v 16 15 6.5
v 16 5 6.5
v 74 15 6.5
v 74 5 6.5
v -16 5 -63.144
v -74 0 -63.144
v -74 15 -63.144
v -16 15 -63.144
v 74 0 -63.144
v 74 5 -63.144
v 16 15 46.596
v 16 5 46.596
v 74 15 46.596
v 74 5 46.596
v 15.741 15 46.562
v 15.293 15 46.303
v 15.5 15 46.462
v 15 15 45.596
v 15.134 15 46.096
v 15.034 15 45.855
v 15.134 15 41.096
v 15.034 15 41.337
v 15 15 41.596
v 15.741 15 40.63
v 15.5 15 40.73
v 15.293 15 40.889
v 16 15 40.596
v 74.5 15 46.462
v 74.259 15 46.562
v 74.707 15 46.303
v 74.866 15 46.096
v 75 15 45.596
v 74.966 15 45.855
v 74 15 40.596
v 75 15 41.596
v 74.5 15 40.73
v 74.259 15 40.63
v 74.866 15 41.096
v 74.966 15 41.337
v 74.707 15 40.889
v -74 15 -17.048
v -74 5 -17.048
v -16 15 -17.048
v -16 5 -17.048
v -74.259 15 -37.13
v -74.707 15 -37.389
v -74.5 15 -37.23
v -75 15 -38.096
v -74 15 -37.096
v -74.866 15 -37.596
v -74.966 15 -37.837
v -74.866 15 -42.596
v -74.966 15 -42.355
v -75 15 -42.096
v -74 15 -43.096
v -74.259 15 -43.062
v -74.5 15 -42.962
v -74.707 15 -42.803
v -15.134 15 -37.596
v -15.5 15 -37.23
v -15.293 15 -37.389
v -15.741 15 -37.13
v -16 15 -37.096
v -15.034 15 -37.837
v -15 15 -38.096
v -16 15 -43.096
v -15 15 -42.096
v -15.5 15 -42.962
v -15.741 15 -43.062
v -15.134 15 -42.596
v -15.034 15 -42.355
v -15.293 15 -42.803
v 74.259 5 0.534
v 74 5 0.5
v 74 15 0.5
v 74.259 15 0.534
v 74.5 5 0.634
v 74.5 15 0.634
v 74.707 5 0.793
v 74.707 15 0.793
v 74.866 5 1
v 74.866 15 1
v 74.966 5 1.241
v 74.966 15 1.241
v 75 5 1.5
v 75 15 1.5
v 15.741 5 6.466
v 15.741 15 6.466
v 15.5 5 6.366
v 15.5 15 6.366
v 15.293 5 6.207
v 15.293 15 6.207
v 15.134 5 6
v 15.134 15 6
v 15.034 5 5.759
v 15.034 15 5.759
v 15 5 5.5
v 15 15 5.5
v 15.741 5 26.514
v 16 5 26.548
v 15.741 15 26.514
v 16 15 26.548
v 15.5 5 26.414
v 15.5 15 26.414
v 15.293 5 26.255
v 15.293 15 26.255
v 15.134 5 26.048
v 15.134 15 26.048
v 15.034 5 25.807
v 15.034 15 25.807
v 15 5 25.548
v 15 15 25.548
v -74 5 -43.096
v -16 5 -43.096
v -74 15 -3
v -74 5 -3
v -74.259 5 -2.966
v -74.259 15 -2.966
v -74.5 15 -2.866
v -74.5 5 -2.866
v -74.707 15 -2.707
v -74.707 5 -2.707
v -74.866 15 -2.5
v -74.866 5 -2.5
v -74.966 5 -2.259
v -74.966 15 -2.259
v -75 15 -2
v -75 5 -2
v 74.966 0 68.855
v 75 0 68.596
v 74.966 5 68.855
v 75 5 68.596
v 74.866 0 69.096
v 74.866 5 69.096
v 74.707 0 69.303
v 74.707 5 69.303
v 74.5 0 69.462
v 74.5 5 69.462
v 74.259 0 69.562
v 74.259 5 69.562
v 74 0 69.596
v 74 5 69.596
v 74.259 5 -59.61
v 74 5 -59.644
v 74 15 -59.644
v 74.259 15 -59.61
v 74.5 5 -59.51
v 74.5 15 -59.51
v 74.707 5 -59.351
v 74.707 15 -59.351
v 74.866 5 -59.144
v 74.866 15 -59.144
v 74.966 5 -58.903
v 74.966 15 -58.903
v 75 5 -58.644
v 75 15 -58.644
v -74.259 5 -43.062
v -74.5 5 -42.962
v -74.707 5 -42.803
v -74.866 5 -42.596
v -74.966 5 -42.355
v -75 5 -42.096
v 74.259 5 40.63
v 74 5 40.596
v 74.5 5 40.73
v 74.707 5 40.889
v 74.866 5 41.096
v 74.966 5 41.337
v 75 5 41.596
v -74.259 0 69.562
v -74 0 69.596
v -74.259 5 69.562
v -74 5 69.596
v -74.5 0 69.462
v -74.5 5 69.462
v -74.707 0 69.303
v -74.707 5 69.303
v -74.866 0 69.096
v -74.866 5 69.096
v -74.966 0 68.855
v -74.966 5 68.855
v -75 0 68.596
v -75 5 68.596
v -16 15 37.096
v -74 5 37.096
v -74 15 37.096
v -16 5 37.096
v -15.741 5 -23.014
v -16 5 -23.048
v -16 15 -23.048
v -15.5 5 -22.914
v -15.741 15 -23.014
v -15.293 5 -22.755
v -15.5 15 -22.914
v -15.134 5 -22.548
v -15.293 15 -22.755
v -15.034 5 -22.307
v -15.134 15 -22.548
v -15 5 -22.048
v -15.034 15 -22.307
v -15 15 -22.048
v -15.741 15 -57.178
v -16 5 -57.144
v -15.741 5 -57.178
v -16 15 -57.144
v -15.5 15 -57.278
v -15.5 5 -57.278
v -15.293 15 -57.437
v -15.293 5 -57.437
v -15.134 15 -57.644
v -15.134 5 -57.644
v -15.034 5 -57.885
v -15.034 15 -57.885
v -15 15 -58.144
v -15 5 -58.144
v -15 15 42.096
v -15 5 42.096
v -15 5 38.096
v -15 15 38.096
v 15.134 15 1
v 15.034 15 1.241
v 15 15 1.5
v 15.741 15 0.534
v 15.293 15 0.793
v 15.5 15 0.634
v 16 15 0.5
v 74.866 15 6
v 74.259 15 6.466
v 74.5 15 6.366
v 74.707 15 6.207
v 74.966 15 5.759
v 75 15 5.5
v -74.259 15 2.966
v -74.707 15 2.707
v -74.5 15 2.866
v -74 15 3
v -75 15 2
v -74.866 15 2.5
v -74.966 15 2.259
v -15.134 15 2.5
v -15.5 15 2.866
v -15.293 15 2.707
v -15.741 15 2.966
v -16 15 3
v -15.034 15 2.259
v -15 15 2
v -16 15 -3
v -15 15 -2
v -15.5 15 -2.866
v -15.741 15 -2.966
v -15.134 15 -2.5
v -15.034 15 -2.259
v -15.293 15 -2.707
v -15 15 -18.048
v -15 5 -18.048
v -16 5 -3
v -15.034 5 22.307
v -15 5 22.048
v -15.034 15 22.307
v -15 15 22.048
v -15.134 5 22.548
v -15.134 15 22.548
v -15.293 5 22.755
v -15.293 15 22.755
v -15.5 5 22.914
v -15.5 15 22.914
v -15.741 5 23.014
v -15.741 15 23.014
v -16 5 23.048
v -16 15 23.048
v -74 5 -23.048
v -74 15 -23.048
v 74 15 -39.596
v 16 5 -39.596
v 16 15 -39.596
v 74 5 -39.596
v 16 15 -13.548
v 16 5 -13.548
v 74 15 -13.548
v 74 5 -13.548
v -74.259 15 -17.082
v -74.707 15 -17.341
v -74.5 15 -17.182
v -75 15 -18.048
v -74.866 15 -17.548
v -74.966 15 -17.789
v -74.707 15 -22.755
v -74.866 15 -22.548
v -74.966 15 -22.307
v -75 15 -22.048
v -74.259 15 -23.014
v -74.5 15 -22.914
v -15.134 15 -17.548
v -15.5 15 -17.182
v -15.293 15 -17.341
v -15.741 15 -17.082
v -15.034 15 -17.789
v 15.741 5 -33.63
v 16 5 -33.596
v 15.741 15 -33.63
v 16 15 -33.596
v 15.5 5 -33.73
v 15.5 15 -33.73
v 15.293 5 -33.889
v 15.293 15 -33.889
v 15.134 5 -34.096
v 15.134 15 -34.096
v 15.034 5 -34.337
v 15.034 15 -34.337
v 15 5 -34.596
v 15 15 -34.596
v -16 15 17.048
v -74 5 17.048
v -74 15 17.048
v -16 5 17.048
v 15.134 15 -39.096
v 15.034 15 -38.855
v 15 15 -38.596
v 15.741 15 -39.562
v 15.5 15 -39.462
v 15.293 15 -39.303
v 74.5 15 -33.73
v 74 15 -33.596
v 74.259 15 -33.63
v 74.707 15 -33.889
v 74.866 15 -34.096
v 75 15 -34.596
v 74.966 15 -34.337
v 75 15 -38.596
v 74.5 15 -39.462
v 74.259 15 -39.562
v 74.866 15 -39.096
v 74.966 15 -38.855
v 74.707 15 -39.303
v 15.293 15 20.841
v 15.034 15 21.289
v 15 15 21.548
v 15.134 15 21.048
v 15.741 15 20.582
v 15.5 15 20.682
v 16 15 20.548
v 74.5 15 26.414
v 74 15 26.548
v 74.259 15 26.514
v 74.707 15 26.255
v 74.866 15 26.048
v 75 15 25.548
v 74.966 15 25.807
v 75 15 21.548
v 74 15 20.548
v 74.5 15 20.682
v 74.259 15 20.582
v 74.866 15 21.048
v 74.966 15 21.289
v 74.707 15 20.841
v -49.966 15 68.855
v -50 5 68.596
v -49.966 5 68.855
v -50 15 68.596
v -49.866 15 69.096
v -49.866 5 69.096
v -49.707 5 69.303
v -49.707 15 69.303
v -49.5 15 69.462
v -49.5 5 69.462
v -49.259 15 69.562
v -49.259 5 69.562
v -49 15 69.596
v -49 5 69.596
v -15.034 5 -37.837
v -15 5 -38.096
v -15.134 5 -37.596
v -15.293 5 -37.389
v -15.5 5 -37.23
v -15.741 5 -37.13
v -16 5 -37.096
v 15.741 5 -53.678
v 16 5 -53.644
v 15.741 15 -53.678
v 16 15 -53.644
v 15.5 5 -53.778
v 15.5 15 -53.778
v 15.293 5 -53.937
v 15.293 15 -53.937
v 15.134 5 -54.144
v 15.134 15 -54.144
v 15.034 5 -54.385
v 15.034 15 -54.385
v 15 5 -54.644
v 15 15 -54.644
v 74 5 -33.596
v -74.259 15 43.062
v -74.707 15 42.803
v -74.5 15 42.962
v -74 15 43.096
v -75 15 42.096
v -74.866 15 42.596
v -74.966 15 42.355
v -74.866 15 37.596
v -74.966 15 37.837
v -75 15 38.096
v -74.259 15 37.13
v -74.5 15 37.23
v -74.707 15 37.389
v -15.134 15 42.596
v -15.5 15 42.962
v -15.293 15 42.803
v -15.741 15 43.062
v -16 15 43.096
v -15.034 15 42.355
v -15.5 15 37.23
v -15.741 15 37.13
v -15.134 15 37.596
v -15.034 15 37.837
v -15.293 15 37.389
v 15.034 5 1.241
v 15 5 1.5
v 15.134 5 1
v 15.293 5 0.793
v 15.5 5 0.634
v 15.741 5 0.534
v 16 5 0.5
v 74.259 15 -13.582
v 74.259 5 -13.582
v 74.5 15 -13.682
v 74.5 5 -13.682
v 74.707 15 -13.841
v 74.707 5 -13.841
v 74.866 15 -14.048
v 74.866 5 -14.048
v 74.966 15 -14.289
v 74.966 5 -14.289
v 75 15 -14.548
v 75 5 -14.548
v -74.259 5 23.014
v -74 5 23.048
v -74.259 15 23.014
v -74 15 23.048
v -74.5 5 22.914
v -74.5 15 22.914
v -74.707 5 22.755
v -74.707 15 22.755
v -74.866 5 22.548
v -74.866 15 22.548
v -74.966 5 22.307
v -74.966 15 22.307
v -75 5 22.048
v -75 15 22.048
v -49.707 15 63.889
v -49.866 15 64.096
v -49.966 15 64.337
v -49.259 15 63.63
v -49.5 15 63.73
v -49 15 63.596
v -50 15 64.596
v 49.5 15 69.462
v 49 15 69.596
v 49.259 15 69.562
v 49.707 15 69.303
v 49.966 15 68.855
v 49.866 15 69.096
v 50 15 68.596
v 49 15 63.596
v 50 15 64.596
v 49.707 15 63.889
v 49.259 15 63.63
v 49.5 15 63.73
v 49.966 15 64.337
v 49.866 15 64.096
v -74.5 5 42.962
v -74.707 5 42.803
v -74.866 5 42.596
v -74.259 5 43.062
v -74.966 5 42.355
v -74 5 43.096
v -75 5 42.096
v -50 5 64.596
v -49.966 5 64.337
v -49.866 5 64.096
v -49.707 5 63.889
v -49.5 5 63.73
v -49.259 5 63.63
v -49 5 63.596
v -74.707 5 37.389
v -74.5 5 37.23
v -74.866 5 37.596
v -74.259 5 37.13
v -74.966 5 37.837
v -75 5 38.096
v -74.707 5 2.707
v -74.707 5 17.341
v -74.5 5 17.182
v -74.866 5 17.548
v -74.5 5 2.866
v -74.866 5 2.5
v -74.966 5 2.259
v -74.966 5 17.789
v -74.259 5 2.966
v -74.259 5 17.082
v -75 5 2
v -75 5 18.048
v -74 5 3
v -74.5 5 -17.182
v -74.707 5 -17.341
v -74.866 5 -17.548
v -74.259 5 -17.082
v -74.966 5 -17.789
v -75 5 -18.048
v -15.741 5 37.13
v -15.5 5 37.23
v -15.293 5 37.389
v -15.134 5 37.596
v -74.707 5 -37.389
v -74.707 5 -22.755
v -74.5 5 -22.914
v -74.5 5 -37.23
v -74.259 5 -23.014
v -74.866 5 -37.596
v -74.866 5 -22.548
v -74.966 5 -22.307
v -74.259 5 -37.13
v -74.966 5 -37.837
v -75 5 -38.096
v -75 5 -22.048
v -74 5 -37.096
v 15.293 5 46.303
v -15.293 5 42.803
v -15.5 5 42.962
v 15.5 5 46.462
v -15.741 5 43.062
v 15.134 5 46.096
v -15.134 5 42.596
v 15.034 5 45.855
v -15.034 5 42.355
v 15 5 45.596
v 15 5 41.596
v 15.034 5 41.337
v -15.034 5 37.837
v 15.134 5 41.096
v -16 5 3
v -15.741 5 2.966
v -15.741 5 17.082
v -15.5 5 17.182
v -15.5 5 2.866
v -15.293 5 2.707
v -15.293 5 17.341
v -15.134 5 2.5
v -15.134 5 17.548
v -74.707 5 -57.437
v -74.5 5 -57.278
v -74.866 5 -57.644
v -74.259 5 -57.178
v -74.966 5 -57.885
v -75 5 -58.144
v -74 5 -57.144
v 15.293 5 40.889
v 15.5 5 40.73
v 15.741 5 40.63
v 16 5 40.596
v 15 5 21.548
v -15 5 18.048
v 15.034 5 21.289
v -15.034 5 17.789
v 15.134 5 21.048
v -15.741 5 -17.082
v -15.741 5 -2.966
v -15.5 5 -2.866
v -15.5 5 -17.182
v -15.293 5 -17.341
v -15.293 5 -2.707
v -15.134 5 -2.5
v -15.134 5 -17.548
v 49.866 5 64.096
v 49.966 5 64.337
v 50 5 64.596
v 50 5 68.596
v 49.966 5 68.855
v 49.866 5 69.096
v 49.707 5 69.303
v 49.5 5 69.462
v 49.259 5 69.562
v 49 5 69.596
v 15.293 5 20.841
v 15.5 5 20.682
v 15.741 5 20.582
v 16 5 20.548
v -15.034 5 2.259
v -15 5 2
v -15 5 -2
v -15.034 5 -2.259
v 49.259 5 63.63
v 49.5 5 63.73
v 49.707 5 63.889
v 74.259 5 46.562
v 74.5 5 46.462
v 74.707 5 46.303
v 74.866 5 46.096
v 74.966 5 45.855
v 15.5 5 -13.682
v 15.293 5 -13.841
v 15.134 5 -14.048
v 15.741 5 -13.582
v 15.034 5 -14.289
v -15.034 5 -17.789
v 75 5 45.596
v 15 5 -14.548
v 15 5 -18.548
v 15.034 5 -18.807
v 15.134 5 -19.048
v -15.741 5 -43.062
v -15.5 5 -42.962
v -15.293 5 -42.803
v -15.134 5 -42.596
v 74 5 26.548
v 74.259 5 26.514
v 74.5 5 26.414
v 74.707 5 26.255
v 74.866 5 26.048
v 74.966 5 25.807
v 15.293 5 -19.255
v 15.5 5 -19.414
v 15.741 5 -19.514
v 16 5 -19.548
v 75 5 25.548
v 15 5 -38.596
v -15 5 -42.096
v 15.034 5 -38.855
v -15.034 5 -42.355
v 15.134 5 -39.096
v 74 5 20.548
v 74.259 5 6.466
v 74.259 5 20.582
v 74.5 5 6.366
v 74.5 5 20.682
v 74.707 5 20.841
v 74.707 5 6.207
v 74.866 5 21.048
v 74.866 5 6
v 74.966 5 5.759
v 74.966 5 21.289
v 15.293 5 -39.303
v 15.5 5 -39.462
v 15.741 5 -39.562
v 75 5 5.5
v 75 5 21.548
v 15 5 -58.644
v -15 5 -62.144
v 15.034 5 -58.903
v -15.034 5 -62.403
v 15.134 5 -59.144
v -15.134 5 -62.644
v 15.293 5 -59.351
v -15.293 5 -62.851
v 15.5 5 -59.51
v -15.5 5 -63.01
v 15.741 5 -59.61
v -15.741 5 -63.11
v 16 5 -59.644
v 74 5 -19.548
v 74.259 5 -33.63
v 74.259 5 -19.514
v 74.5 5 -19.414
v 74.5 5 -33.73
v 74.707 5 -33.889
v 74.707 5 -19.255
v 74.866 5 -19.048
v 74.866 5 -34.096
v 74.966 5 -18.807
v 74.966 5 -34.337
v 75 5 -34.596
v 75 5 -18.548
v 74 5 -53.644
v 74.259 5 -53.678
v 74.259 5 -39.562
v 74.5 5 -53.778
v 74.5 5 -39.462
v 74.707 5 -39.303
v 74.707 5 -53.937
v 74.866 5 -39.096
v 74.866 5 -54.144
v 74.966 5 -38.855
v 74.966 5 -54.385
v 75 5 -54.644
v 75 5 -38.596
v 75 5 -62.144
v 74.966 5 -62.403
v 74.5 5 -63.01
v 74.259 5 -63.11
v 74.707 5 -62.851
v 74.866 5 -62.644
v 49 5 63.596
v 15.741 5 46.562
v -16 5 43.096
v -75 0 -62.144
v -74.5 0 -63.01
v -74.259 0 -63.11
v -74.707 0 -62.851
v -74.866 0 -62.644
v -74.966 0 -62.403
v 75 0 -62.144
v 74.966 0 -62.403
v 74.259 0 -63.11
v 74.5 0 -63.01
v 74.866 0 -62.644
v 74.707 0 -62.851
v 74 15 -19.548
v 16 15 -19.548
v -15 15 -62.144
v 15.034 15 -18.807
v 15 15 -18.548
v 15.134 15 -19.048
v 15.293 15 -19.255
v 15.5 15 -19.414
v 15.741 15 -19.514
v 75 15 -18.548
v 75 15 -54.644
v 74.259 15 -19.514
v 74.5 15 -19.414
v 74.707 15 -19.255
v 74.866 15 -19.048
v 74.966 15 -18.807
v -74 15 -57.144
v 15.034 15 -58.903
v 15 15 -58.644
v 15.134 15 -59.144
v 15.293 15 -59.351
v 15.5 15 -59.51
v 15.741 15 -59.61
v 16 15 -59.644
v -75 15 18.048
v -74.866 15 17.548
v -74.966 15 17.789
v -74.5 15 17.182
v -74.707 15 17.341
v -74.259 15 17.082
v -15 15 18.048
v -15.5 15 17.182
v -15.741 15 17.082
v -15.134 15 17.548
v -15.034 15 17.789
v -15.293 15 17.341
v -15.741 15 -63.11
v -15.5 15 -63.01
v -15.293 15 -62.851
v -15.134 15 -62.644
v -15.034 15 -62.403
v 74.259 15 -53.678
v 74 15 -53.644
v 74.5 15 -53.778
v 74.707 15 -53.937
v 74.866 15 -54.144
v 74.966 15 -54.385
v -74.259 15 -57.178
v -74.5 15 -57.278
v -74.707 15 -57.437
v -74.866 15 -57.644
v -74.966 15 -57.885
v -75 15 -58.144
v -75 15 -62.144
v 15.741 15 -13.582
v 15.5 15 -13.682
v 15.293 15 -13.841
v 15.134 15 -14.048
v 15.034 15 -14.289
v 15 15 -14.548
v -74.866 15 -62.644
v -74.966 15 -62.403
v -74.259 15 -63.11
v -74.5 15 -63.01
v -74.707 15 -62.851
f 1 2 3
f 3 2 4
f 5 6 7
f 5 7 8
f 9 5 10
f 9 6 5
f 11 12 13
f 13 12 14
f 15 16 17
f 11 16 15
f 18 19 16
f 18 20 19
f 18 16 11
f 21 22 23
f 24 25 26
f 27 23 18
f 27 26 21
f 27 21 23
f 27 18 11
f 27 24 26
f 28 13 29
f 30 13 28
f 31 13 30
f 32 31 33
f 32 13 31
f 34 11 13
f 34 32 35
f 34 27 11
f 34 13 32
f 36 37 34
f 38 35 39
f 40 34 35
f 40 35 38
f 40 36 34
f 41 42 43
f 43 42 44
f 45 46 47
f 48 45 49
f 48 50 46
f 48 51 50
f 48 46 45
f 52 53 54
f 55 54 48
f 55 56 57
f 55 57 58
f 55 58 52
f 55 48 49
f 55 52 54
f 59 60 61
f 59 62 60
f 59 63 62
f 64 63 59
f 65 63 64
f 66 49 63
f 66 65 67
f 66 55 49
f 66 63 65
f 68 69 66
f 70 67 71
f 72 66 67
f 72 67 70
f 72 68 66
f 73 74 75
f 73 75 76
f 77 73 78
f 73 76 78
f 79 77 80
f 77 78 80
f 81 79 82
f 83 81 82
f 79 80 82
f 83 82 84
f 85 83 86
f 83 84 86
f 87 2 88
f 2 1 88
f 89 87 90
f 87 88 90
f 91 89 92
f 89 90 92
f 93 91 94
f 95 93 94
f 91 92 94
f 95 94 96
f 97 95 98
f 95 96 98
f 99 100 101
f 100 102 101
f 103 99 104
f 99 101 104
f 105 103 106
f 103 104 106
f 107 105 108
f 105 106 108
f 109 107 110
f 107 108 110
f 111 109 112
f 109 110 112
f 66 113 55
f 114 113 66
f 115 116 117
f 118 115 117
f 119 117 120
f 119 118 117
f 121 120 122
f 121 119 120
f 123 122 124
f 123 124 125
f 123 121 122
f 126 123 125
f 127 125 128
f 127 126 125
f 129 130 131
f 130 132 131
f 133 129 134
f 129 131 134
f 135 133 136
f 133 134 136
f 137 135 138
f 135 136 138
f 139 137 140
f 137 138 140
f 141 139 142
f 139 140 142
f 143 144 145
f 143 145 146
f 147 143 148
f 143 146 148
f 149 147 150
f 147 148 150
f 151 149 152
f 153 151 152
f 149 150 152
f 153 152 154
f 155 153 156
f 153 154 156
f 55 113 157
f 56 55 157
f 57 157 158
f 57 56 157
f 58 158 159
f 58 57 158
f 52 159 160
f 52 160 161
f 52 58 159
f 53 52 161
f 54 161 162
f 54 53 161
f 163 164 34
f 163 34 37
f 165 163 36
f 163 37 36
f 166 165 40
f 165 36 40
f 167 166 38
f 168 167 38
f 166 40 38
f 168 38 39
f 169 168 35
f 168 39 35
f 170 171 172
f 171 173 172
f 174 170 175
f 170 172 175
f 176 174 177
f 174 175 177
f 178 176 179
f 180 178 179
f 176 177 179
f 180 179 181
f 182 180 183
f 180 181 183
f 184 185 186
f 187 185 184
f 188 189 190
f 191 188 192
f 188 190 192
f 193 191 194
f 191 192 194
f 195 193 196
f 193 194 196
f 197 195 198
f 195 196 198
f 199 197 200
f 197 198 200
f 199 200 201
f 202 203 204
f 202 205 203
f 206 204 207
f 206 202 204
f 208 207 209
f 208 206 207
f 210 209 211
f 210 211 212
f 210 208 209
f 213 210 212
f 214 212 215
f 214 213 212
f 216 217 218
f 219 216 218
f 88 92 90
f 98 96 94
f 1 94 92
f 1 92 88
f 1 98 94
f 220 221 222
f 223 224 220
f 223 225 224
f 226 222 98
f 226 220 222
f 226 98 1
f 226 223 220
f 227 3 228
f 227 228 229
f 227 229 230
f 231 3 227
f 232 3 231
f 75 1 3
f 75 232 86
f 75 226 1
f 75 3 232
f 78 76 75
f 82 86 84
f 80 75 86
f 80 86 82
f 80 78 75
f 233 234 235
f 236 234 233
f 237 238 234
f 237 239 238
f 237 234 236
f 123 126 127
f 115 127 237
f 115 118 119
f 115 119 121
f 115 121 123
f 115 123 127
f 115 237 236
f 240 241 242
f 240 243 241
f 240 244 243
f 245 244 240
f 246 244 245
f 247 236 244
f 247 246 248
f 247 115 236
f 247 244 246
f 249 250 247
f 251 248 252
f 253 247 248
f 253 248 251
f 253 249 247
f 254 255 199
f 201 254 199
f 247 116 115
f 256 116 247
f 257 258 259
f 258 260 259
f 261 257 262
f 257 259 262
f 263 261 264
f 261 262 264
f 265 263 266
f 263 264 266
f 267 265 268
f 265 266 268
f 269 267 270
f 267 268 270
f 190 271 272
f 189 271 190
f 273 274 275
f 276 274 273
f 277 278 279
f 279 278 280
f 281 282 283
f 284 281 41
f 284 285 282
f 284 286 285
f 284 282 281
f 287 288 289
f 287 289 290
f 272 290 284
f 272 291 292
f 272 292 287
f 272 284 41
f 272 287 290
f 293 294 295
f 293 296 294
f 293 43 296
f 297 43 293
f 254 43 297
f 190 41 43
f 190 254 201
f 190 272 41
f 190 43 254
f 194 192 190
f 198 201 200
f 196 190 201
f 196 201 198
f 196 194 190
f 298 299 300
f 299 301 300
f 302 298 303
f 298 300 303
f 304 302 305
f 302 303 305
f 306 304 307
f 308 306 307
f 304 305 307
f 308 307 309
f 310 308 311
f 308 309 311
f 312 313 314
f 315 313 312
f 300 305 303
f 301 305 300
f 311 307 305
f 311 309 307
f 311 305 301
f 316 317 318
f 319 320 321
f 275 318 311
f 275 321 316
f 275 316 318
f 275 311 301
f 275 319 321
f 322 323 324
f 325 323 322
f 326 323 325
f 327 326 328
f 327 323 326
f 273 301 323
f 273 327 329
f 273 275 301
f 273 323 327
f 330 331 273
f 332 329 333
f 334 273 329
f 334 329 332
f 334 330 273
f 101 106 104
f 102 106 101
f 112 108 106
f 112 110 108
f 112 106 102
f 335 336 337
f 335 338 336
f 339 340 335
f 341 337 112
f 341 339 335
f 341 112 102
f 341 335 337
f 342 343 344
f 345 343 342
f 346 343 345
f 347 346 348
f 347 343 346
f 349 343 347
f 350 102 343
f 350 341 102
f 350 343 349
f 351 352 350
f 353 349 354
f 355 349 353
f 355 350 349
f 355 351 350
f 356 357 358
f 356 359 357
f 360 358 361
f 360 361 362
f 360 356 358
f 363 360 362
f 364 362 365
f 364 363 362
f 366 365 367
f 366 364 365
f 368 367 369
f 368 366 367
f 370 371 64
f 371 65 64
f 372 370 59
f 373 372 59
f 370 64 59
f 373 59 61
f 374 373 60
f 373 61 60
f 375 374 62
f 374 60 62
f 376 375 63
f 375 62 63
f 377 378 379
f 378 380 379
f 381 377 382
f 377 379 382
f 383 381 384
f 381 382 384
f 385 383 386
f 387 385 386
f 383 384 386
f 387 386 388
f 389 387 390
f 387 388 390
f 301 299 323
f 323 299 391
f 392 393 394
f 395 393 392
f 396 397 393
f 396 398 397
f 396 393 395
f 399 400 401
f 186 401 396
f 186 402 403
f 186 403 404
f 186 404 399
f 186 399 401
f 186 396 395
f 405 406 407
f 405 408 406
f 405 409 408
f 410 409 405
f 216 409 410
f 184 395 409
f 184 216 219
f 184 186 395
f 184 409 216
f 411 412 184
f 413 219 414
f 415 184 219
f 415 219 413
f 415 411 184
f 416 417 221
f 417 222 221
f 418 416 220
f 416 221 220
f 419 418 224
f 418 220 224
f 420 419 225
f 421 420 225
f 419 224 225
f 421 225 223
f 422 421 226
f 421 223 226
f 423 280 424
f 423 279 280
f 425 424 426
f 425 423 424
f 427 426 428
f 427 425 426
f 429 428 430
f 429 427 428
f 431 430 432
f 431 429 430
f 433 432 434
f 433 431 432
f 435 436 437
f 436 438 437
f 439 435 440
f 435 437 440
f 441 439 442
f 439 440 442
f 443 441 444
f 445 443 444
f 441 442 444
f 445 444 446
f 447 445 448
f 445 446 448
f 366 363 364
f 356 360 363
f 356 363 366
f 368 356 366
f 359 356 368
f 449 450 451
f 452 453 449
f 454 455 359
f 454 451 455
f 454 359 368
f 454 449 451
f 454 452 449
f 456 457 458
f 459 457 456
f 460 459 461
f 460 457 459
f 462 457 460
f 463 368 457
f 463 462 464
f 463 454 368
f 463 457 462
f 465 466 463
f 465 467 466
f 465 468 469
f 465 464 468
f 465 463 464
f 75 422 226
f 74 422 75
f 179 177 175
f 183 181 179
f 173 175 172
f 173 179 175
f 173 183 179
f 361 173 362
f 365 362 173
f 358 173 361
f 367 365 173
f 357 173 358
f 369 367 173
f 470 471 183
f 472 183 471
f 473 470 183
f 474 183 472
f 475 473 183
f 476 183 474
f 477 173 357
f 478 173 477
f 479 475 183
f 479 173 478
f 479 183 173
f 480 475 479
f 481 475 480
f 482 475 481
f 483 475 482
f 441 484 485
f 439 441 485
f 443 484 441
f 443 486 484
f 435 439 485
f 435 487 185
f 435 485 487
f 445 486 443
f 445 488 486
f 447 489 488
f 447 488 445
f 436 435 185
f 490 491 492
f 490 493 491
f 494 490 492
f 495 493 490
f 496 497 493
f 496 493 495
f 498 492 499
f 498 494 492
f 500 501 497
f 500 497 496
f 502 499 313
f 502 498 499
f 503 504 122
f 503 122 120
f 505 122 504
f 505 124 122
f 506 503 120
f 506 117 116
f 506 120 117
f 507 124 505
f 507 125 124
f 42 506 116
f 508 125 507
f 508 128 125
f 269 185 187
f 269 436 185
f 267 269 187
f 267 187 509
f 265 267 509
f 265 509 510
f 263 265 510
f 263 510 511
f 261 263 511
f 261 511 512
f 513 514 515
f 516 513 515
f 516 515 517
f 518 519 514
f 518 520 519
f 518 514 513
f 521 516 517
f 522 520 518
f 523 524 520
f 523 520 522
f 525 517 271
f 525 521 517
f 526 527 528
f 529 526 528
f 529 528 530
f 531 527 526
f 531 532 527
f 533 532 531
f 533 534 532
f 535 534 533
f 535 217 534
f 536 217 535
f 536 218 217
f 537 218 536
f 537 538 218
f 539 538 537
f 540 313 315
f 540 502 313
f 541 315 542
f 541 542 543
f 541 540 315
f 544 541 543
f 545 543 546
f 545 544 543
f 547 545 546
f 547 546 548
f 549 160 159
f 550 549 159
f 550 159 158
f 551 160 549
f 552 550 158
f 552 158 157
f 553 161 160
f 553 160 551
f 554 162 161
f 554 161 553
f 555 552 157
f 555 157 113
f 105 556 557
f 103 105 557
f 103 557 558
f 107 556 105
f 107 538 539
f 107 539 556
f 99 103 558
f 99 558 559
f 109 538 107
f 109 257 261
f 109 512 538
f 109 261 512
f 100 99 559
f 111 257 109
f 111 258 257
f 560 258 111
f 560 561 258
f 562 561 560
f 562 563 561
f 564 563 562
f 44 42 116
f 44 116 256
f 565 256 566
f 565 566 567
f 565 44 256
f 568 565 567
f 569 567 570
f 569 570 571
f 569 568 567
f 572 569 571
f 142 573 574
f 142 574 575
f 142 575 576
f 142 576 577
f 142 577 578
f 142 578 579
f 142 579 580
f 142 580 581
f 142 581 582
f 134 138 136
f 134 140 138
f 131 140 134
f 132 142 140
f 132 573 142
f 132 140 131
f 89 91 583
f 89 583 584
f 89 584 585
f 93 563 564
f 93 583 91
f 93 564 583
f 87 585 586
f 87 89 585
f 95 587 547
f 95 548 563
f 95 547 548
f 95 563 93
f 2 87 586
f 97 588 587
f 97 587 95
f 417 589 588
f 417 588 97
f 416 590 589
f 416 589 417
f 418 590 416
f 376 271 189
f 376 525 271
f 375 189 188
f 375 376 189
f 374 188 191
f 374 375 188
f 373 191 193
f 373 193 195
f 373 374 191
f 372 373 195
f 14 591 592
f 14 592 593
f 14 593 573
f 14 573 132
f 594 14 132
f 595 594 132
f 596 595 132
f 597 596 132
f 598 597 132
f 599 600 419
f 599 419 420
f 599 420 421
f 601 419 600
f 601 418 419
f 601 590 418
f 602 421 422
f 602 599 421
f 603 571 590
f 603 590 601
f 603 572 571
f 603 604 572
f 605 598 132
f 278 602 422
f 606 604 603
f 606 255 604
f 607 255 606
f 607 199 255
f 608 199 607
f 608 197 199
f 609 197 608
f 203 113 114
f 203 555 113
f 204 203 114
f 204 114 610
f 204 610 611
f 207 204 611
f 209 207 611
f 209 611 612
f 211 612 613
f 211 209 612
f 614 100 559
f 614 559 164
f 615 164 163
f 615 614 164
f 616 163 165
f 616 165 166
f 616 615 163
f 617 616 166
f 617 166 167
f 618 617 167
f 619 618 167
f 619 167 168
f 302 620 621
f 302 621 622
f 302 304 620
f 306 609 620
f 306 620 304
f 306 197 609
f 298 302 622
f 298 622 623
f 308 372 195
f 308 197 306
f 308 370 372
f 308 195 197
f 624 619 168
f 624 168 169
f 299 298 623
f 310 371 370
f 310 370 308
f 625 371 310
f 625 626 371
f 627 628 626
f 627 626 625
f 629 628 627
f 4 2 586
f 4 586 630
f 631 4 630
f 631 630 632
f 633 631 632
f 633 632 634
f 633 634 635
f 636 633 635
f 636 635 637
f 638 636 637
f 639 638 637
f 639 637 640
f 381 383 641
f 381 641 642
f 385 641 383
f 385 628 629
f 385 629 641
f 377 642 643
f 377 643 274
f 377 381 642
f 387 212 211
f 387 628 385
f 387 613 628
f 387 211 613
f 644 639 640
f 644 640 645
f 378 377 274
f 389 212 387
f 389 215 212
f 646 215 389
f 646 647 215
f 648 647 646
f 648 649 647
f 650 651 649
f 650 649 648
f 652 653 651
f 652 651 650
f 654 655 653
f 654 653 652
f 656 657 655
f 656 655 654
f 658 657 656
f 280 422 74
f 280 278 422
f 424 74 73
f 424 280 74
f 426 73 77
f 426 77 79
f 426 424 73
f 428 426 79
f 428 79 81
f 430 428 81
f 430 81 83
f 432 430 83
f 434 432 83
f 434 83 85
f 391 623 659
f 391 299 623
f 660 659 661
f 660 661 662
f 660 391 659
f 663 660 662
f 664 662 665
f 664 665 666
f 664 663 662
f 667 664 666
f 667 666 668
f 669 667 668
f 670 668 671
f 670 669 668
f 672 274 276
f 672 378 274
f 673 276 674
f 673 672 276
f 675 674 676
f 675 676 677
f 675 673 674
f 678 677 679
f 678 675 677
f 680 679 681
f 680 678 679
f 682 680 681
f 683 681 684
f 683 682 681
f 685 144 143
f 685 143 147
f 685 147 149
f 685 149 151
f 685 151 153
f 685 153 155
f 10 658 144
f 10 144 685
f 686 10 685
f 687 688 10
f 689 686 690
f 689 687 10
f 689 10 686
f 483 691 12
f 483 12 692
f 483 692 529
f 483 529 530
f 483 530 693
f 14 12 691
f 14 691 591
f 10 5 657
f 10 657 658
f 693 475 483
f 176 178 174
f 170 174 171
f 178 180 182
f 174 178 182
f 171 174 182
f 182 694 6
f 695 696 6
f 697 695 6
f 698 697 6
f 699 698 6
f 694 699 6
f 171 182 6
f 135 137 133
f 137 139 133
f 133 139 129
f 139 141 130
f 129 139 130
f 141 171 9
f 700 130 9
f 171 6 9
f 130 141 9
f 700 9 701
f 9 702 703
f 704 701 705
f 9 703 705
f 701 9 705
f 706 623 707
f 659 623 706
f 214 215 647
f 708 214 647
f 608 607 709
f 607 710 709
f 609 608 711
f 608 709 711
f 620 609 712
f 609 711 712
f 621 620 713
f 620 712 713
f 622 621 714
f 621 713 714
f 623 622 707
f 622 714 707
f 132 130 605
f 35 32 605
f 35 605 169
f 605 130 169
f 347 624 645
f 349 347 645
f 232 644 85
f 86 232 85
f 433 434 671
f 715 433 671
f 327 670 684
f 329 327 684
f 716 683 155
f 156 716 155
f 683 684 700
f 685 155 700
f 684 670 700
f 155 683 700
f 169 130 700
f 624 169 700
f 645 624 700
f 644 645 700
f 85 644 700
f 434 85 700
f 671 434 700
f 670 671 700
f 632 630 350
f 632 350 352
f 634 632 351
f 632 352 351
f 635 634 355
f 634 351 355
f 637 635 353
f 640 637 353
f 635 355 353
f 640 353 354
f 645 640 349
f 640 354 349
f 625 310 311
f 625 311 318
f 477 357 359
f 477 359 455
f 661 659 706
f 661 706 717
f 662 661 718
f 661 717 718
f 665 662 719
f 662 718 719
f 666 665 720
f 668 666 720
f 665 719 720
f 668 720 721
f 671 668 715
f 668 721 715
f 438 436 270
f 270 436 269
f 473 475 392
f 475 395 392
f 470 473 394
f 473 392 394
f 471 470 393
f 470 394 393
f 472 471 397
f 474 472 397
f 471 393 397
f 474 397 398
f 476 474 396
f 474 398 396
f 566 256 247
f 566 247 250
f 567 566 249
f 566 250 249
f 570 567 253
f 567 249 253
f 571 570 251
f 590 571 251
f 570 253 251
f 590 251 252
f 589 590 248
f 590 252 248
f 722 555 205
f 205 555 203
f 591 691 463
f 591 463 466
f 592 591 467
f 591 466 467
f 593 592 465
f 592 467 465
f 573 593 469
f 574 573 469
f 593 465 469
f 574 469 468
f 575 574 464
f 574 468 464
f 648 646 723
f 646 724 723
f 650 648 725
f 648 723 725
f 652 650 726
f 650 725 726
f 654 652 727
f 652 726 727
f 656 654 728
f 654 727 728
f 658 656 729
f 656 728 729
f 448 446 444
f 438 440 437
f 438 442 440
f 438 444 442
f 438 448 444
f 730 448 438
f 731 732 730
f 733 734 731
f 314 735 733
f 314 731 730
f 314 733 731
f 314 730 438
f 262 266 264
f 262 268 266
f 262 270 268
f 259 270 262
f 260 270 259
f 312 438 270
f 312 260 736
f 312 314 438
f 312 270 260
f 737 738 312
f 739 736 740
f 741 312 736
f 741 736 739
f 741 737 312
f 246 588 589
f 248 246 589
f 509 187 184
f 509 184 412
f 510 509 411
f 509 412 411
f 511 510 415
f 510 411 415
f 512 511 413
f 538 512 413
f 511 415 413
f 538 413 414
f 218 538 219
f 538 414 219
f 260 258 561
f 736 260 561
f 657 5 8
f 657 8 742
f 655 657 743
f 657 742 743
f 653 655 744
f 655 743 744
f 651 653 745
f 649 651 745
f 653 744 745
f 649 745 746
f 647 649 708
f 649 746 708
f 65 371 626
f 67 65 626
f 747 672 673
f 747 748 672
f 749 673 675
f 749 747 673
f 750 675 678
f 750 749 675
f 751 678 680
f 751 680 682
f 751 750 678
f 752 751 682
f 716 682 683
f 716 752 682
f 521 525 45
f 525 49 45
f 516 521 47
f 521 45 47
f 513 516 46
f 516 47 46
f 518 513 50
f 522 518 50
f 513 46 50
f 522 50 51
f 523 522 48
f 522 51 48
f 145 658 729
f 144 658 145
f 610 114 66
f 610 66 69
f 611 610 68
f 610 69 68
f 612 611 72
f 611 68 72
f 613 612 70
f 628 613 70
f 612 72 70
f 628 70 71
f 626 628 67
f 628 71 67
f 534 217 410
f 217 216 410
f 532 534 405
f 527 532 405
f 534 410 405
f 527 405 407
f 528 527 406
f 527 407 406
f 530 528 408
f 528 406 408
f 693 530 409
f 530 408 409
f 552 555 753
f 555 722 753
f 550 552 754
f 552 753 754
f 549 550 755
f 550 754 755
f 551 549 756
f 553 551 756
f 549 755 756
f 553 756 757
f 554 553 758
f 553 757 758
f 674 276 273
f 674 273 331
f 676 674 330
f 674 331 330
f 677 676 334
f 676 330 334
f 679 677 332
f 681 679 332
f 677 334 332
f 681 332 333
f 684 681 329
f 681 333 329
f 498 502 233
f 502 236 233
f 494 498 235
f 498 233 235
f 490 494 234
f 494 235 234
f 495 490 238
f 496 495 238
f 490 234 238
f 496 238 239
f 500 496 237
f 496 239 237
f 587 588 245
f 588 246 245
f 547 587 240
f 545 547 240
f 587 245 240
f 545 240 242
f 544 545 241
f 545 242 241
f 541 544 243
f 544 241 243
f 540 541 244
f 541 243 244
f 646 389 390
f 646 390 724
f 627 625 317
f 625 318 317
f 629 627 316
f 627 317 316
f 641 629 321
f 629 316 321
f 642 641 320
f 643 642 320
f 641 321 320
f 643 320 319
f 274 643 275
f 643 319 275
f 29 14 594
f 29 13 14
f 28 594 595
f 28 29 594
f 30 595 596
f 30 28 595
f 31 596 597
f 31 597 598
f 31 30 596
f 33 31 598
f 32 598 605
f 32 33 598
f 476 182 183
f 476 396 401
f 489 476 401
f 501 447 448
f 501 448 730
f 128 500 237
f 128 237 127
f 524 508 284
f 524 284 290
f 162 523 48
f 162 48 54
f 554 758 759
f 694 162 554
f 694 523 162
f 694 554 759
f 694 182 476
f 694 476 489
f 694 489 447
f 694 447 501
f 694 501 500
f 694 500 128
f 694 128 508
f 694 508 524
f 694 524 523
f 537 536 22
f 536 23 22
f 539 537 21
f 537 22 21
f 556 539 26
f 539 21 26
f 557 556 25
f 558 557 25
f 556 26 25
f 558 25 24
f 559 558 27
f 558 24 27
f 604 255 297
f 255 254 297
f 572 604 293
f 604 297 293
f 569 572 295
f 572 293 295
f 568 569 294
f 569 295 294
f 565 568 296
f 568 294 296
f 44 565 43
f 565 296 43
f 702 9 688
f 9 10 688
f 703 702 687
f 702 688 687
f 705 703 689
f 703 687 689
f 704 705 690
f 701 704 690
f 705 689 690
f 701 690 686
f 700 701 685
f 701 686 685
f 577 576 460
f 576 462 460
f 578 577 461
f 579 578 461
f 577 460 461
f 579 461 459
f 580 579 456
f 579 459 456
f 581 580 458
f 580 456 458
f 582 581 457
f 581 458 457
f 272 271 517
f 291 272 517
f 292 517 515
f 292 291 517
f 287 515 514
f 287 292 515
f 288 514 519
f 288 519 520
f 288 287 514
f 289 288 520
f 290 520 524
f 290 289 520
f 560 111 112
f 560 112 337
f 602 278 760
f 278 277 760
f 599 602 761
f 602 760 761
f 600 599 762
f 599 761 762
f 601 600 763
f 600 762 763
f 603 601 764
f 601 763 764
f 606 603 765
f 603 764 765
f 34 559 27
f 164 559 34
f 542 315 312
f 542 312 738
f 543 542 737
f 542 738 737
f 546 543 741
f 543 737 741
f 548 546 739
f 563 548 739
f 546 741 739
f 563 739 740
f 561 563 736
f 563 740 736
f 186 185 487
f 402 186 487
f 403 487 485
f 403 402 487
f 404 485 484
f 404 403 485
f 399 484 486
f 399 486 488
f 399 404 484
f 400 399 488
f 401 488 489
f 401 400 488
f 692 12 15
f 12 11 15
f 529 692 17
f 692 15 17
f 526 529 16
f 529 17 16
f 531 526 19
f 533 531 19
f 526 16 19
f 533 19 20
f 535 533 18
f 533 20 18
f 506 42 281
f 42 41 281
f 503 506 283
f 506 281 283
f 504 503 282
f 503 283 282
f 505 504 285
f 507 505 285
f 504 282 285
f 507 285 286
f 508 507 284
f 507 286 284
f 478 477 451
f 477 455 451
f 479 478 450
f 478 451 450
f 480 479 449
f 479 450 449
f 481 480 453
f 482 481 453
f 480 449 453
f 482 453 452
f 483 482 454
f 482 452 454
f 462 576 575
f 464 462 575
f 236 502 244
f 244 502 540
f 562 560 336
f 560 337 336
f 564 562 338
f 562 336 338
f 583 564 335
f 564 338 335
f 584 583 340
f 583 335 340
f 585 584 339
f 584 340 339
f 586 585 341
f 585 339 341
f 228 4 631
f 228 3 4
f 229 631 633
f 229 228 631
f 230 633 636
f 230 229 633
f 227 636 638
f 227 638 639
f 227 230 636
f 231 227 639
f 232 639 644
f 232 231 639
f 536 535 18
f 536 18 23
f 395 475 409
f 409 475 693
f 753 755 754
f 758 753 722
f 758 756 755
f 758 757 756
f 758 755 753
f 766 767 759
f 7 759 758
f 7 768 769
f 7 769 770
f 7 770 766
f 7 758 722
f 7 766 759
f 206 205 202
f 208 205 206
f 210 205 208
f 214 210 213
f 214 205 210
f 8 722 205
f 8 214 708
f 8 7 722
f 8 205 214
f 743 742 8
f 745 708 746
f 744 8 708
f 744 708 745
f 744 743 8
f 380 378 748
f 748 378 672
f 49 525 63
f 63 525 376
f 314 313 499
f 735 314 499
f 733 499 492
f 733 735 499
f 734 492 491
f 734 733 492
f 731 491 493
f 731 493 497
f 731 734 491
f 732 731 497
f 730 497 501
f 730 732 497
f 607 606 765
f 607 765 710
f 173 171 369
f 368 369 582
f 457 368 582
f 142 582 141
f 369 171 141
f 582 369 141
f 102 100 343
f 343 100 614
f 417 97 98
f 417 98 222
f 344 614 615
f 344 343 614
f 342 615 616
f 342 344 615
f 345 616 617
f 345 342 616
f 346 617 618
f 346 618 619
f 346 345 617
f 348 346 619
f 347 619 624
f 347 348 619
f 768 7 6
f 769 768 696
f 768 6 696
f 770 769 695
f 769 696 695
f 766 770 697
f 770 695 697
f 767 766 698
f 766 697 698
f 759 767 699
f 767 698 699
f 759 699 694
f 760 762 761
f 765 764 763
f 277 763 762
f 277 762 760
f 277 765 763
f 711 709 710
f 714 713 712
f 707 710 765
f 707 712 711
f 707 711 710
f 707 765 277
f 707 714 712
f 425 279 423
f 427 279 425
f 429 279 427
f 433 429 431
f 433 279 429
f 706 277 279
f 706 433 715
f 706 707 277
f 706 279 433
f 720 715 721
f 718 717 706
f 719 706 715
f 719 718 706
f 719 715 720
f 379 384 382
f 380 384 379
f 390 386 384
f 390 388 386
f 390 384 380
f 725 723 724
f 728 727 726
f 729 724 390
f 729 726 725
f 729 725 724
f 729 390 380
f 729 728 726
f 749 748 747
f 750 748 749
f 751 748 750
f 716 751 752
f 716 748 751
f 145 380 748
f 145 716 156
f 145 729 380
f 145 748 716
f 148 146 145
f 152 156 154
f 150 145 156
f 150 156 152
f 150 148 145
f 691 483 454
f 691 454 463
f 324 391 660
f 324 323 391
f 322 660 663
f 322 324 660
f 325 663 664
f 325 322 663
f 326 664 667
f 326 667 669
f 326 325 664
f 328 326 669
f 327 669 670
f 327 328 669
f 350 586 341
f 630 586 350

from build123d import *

# Parameters (mm, degrees)
SKETCH1_W           = 150
SKETCH1_H           = 132.74
BOSS_EXTRUDE1_DEPTH = 5
SKETCH1_3_W         = 60
SKETCH1_3_H         = 6
SKETCH1_3_W_2       = 100
BOSS_EXTRUDE2_DEPTH = 15
FILLET1_R           = 1


with BuildPart() as part:
    # Sketch1 → Boss-Extrude1 (new body)
    with BuildSketch(Plane(origin=(0, 0, 0), x_dir=(1, 0, 0), z_dir=(0, 1, 0))):
        with Locations((0, -3.226)):
            Rectangle(SKETCH1_W, SKETCH1_H)
    extrude(amount=BOSS_EXTRUDE1_DEPTH)

    # Sketch1_3 → Boss-Extrude2 (add)
    with BuildSketch(Plane(origin=(0, 0, 0), x_dir=(1, 0, 0), z_dir=(0, 1, 0))):
        with Locations((-45, 60.144)):
            Rectangle(SKETCH1_3_W, SKETCH1_3_H)
        with Locations((-45, 40.096)):
            Rectangle(SKETCH1_3_W, SKETCH1_3_H)
        with Locations((45, 56.644)):
            Rectangle(SKETCH1_3_W, SKETCH1_3_H)
        with Locations((-45, 20.048)):
            Rectangle(SKETCH1_3_W, SKETCH1_3_H)
        with Locations((45, 36.596)):
            Rectangle(SKETCH1_3_W, SKETCH1_3_H)
        with Locations((-45, 0)):
            Rectangle(SKETCH1_3_W, SKETCH1_3_H)
        with Locations((45, 16.548)):
            Rectangle(SKETCH1_3_W, SKETCH1_3_H)
        with Locations((-45, -20.048)):
            Rectangle(SKETCH1_3_W, SKETCH1_3_H)
        with Locations((45, -3.5)):
            Rectangle(SKETCH1_3_W, SKETCH1_3_H)
        with Locations((-45, -40.096)):
            Rectangle(SKETCH1_3_W, SKETCH1_3_H)
        with Locations((45, -23.548)):
            Rectangle(SKETCH1_3_W, SKETCH1_3_H)
        with Locations((0, -66.596)):
            Rectangle(SKETCH1_3_W_2, SKETCH1_3_H)
        with Locations((45, -43.596)):
            Rectangle(SKETCH1_3_W, SKETCH1_3_H)
    extrude(amount=BOSS_EXTRUDE2_DEPTH)

    # Fillet1
    fillet1_edges = [part.edges().sort_by_distance(p)[0] for p in [
        (-15, 10, -3),
        (-75, 10, -3),
        (-75, 10, 3),
        (-15, 10, 3),
        (-15, 10, -23.048),
        (-75, 10, -23.048),
        (-75, 10, -17.048),
        (-15, 10, -17.048),
        (75, 2.5, -63.144),
        (75, 2.5, 69.596),
        (-75, 2.5, 69.596),
        (-75, 7.5, -63.144),
        (-15, 10, -43.096),
        (-75, 10, -43.096),
        (-75, 10, -37.096),
        (-15, 10, -37.096),
        (-75, 10, -57.144),
        (-15, 10, -57.144),
        (-15, 10, -63.144),
        (75, 10, -59.644),
        (15, 10, -59.644),
        (15, 10, -53.644),
        (75, 10, -53.644),
        (75, 10, -39.596),
        (15, 10, -39.596),
        (15, 10, -33.596),
        (75, 10, -33.596),
        (75, 10, -19.548),
        (15, 10, -19.548),
        (15, 10, -13.548),
        (75, 10, -13.548),
        (75, 10, 0.5),
        (15, 10, 0.5),
        (15, 10, 6.5),
        (75, 10, 6.5),
        (75, 10, 20.548),
        (15, 10, 20.548),
        (15, 10, 26.548),
        (75, 10, 26.548),
        (75, 10, 40.596),
        (15, 10, 40.596),
        (15, 10, 46.596),
        (75, 10, 46.596),
        (50, 10, 63.596),
        (-50, 10, 63.596),
        (-50, 10, 69.596),
        (50, 10, 69.596),
        (-15, 10, 37.096),
        (-75, 10, 37.096),
        (-75, 10, 43.096),
        (-15, 10, 43.096),
        (-15, 10, 17.048),
        (-75, 10, 17.048),
        (-75, 10, 23.048),
        (-15, 10, 23.048),
    ]]
    fillet(fillet1_edges, radius=FILLET1_R)


solid = part.part
